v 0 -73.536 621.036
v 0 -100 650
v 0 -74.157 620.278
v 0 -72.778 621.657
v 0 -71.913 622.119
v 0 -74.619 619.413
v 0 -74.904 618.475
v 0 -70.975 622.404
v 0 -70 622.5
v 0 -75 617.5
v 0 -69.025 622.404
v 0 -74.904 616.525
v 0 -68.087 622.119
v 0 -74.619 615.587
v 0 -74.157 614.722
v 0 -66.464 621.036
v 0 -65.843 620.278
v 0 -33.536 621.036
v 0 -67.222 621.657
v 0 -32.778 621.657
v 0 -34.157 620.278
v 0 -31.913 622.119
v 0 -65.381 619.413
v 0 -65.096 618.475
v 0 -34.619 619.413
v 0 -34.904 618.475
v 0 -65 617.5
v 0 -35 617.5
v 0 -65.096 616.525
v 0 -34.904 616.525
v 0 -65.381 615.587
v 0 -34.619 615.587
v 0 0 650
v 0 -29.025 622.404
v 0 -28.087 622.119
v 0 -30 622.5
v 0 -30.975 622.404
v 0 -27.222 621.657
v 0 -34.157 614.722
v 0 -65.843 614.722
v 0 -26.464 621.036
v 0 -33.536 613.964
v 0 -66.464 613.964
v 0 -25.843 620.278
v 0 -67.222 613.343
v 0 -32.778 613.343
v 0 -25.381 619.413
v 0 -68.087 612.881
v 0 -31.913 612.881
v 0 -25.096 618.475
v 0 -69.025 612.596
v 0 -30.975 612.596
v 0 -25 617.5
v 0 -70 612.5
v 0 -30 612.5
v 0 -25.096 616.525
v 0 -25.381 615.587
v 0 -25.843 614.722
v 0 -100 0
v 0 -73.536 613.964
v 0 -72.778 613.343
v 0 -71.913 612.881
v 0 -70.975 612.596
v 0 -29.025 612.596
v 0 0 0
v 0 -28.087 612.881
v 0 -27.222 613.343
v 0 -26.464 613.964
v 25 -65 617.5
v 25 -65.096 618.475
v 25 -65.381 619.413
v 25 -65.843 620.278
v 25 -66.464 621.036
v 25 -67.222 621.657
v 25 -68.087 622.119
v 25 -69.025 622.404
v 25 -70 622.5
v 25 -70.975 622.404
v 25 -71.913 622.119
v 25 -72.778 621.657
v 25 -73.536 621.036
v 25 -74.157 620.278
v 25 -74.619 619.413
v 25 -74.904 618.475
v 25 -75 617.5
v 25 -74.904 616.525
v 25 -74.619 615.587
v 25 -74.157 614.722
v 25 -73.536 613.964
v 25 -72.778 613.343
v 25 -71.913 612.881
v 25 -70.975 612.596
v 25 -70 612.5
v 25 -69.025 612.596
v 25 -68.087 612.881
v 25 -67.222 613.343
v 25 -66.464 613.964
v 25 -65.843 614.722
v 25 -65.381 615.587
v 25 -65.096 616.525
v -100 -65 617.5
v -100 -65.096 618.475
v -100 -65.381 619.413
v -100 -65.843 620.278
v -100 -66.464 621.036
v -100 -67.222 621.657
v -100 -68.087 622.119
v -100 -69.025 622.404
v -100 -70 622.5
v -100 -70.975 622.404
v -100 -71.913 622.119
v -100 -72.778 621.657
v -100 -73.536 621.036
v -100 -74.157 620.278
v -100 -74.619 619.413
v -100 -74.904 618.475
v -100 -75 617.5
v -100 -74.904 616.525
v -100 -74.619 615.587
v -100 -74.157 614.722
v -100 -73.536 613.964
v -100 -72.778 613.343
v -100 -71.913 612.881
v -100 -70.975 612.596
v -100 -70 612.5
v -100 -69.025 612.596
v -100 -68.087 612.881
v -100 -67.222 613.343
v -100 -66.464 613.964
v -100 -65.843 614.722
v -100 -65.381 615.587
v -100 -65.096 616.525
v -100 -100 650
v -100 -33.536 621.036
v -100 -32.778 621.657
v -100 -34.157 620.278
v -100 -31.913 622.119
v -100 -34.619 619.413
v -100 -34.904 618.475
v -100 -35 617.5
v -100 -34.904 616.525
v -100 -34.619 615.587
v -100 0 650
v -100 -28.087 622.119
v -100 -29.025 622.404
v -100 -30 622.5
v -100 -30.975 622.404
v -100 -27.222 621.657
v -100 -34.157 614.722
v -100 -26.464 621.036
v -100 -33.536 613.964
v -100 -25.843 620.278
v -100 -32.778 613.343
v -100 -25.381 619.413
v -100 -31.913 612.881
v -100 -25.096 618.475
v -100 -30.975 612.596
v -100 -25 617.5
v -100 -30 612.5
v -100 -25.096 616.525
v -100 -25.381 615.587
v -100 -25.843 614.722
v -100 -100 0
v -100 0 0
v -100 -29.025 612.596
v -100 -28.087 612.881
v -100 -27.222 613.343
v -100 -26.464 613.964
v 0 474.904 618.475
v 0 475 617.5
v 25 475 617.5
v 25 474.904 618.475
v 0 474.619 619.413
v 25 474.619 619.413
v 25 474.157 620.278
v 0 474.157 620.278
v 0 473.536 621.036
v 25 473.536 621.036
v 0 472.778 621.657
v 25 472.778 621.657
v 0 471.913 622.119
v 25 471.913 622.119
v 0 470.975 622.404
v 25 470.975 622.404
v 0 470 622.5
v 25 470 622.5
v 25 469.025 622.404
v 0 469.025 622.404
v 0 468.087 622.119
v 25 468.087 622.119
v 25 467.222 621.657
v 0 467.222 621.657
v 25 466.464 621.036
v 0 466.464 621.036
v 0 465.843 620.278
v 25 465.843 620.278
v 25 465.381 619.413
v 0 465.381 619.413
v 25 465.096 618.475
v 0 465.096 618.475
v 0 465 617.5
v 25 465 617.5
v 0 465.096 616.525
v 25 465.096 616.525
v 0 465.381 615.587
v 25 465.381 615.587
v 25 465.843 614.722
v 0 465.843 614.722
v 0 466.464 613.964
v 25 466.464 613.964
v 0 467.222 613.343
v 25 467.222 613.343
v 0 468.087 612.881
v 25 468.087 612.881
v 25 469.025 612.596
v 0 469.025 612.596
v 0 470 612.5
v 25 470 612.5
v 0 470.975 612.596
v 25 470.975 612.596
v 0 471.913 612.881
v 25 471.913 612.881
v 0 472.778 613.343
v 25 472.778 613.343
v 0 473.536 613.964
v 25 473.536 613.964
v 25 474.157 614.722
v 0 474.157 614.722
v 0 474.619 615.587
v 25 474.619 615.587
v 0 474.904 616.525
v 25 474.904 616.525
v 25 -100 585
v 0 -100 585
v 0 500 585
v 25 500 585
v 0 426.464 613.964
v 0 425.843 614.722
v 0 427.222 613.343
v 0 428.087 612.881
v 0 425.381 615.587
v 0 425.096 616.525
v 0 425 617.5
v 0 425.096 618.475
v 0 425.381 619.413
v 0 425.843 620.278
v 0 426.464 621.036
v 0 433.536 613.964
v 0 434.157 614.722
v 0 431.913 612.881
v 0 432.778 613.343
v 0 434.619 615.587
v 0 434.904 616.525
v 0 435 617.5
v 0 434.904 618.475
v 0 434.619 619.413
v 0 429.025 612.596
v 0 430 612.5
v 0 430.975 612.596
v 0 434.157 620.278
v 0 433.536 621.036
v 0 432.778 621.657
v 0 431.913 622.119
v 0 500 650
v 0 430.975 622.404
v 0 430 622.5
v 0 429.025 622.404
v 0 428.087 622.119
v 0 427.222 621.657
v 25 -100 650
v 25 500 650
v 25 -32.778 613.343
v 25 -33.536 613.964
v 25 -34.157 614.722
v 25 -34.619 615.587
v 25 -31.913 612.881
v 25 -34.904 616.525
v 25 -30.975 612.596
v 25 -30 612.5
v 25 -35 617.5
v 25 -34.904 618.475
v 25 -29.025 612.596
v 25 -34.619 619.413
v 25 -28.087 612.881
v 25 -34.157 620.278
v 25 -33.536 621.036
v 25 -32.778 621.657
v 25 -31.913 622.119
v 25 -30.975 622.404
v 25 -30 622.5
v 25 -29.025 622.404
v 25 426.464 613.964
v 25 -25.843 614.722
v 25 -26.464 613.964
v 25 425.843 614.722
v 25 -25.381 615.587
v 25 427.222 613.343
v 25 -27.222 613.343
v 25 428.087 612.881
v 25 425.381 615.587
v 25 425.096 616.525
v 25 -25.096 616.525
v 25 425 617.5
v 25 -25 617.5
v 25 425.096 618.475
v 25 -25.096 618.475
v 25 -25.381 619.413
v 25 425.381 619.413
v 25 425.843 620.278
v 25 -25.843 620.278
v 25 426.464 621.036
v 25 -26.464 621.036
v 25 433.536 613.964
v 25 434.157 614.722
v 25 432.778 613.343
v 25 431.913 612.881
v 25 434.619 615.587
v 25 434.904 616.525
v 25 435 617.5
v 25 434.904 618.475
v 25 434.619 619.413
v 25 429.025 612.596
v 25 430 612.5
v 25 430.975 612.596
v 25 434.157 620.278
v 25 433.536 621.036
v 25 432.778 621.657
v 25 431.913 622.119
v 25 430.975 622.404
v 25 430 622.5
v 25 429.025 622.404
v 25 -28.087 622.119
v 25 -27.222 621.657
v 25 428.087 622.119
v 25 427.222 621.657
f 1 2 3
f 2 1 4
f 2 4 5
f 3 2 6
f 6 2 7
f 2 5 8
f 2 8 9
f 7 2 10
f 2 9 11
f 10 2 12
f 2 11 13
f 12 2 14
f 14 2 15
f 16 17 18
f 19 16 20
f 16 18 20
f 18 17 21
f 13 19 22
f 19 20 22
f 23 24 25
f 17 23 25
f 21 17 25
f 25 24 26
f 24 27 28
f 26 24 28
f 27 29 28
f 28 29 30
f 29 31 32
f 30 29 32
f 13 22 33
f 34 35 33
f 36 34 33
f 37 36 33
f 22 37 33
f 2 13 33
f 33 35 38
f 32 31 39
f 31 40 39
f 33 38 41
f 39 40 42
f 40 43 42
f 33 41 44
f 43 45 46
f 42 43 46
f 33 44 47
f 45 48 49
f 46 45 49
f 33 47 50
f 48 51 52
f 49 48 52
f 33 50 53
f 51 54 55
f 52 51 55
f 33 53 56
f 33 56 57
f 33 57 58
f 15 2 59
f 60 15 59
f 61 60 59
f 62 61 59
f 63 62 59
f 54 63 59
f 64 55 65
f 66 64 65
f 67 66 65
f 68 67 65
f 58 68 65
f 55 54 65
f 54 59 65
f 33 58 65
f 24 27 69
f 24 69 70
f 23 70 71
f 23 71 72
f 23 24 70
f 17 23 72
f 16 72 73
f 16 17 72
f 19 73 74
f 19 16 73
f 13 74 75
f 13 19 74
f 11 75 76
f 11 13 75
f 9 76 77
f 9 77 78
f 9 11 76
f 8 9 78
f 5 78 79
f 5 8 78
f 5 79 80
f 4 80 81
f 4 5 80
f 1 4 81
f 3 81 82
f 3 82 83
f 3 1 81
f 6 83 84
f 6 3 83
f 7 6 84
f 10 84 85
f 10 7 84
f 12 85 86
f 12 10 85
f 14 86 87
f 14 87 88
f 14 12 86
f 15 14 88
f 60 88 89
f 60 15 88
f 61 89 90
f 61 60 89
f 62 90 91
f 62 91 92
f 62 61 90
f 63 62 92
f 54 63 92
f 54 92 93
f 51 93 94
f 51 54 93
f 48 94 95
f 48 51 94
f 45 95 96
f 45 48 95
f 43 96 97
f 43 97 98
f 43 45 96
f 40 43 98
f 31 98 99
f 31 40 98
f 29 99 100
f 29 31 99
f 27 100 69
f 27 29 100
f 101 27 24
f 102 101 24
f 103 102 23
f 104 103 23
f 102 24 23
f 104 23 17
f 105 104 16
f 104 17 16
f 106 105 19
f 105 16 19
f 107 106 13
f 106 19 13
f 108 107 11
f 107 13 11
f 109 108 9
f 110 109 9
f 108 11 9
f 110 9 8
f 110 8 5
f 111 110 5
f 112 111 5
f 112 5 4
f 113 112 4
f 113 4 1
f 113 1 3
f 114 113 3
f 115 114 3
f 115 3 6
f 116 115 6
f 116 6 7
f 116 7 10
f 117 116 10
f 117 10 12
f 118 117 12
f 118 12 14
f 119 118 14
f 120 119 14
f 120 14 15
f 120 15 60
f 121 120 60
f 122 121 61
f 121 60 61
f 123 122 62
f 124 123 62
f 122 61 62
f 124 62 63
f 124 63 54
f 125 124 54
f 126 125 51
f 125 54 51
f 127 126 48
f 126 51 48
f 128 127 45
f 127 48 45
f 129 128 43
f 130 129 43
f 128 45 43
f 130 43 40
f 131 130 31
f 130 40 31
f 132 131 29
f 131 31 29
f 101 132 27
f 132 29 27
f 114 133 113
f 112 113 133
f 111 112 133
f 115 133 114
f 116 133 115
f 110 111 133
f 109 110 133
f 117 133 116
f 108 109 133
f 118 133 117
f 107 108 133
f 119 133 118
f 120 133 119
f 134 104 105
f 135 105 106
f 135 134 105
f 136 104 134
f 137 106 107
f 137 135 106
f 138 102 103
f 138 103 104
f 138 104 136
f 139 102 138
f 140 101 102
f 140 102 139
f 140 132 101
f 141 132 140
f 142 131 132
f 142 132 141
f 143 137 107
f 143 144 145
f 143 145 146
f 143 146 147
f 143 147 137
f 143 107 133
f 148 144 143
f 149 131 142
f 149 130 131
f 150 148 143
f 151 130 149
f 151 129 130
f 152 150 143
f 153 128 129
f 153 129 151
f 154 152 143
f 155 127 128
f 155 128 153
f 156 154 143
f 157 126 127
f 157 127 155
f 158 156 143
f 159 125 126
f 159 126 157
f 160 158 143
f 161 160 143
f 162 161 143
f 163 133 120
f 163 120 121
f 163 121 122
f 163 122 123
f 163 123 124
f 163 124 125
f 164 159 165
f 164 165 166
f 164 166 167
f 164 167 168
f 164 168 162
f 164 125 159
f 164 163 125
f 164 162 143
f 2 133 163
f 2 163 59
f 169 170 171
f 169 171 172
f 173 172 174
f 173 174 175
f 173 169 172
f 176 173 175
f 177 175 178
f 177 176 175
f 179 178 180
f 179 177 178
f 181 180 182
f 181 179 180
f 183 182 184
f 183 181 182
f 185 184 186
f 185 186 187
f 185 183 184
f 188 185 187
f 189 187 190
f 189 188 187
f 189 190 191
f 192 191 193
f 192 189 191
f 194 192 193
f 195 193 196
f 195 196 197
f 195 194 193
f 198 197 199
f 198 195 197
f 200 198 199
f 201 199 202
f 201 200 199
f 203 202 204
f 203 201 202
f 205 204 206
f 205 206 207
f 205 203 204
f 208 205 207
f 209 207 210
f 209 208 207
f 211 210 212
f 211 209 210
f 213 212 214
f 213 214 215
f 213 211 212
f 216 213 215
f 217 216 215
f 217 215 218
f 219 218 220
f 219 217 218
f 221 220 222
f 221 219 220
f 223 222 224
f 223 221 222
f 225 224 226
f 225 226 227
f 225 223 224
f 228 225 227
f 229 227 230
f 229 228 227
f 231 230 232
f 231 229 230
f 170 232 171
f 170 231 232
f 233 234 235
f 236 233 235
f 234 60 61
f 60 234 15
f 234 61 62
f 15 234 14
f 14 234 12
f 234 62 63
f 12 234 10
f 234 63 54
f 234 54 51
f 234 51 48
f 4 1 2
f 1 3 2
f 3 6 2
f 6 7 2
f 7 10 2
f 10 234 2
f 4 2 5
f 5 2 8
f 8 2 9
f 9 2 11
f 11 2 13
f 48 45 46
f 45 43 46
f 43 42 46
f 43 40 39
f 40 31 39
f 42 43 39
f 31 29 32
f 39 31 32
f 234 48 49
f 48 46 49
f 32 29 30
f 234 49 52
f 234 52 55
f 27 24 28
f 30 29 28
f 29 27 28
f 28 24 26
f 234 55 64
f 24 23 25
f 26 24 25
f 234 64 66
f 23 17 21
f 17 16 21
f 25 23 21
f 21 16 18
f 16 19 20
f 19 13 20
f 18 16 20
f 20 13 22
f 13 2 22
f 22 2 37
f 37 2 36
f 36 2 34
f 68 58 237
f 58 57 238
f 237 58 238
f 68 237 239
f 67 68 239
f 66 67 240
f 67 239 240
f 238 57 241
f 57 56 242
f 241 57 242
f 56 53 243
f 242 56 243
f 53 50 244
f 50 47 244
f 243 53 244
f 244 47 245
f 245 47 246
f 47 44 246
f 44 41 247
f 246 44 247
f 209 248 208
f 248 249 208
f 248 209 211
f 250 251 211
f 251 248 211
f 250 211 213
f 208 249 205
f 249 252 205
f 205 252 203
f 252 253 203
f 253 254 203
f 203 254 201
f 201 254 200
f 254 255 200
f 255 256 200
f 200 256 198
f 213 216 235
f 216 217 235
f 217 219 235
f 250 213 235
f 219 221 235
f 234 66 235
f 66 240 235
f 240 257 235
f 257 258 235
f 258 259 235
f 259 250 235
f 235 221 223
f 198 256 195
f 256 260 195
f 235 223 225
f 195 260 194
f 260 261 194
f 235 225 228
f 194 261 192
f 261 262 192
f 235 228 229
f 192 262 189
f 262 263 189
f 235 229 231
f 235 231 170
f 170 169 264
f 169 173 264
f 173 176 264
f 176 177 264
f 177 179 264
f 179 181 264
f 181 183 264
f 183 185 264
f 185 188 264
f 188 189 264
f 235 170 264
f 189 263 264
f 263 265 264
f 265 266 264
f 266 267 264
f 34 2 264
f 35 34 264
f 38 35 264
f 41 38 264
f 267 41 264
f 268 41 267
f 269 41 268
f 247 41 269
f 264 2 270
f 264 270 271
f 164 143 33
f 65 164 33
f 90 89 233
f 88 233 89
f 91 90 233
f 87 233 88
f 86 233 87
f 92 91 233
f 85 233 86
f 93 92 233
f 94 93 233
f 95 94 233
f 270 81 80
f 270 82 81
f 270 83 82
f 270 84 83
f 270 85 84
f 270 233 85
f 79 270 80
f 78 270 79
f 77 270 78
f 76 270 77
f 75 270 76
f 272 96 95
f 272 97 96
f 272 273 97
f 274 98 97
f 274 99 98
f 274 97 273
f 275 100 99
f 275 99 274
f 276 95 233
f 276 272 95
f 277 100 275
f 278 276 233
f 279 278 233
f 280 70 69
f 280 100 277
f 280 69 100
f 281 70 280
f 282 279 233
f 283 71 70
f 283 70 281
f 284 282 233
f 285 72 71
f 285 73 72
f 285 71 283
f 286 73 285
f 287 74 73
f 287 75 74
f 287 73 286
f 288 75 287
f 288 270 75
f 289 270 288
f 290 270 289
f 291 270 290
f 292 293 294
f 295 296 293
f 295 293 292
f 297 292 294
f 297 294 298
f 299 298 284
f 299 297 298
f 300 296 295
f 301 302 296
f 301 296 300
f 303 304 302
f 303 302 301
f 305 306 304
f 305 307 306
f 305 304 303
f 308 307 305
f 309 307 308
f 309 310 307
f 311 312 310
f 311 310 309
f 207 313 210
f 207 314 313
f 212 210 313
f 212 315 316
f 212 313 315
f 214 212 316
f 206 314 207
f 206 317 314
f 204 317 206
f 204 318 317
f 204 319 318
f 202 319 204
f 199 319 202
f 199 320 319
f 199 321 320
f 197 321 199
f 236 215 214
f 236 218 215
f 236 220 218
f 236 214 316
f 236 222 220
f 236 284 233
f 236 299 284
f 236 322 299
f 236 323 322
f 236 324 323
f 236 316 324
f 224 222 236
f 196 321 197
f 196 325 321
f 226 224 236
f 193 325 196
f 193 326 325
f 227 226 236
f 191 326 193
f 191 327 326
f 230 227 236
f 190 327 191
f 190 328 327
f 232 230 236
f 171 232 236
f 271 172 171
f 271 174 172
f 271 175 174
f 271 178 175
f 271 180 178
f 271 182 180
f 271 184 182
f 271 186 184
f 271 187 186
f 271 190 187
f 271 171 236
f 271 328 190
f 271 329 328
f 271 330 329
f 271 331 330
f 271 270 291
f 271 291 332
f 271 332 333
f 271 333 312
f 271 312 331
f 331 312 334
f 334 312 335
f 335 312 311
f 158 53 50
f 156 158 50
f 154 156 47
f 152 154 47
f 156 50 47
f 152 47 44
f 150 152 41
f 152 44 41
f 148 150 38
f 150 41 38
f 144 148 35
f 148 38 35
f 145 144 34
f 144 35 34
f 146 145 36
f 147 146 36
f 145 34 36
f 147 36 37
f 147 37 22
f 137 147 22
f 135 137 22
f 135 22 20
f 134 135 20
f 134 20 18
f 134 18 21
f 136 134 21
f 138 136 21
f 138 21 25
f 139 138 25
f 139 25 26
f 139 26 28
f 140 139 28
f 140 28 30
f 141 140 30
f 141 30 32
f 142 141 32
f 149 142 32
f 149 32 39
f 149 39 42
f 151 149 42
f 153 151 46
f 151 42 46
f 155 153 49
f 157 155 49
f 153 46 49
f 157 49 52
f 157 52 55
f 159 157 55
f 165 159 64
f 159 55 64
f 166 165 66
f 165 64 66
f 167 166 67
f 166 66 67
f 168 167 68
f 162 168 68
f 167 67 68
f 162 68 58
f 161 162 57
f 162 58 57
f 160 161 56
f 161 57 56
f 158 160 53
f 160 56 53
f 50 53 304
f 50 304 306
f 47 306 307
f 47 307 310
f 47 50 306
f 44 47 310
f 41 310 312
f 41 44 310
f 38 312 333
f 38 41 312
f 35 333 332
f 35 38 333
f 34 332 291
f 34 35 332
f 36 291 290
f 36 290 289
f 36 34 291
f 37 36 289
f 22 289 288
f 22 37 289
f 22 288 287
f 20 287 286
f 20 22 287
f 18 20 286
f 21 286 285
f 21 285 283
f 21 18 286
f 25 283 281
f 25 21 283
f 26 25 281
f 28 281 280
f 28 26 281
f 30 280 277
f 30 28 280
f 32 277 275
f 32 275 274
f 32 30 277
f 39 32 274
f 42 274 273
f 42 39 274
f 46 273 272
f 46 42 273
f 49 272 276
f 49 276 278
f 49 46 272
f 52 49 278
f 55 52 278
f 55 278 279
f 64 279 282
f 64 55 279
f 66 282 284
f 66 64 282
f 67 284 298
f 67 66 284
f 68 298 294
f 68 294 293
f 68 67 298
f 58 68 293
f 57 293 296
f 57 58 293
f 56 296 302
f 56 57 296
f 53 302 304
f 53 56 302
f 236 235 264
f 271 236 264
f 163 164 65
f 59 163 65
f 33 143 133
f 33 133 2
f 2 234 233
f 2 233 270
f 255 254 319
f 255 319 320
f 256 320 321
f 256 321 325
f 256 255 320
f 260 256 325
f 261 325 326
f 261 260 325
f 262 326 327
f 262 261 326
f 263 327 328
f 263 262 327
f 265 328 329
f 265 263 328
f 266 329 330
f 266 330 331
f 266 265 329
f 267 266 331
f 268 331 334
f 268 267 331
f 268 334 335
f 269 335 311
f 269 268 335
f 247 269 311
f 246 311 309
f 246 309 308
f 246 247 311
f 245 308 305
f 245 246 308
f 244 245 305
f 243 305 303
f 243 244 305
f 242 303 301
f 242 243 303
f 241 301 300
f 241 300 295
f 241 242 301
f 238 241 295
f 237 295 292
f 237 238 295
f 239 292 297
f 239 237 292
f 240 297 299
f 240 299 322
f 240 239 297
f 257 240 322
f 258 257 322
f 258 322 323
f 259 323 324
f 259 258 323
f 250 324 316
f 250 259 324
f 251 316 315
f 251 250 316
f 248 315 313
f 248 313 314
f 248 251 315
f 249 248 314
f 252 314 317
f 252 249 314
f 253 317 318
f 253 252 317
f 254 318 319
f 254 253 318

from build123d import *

# Parameters (mm, degrees)
F0_W     = 100
F0_H     = 100
F1_DEPTH = 650
F2_R     = 5
F3_DEPTH = 100.001
F4_W     = 600
F4_H     = 65
F4_R     = 5
F5_DEPTH = 25


with BuildPart() as f1:
    # F0 (on Top) → F1 (new body)
    with BuildSketch(Plane.XY):
        with Locations((-50, -50)):
            Rectangle(F0_W, F0_H)
    extrude(amount=F1_DEPTH)

    # F2 (on face) → F3 (cut, through all)
    with BuildSketch(Plane.YZ):
        with Locations((-70, 617.5)):
            Circle(F2_R)
        with Locations((-30, 617.5)):
            Circle(F2_R)
    extrude(amount=-F3_DEPTH, mode=Mode.SUBTRACT)


with BuildPart() as f5:
    # F4 (on Right) → F5 (new body)
    with BuildSketch(Plane.YZ):
        with Locations((200, 617.5)):
            Rectangle(F4_W, F4_H)
        with Locations((-70, 617.5)):
            Circle(F4_R, mode=Mode.SUBTRACT)
        with Locations((-30, 617.5)):
            Circle(F4_R, mode=Mode.SUBTRACT)
        with Locations((430, 617.5)):
            Circle(F4_R, mode=Mode.SUBTRACT)
        with Locations((470, 617.5)):
            Circle(F4_R, mode=Mode.SUBTRACT)
    extrude(amount=F5_DEPTH)


solid = Compound([f1.part, f5.part])
